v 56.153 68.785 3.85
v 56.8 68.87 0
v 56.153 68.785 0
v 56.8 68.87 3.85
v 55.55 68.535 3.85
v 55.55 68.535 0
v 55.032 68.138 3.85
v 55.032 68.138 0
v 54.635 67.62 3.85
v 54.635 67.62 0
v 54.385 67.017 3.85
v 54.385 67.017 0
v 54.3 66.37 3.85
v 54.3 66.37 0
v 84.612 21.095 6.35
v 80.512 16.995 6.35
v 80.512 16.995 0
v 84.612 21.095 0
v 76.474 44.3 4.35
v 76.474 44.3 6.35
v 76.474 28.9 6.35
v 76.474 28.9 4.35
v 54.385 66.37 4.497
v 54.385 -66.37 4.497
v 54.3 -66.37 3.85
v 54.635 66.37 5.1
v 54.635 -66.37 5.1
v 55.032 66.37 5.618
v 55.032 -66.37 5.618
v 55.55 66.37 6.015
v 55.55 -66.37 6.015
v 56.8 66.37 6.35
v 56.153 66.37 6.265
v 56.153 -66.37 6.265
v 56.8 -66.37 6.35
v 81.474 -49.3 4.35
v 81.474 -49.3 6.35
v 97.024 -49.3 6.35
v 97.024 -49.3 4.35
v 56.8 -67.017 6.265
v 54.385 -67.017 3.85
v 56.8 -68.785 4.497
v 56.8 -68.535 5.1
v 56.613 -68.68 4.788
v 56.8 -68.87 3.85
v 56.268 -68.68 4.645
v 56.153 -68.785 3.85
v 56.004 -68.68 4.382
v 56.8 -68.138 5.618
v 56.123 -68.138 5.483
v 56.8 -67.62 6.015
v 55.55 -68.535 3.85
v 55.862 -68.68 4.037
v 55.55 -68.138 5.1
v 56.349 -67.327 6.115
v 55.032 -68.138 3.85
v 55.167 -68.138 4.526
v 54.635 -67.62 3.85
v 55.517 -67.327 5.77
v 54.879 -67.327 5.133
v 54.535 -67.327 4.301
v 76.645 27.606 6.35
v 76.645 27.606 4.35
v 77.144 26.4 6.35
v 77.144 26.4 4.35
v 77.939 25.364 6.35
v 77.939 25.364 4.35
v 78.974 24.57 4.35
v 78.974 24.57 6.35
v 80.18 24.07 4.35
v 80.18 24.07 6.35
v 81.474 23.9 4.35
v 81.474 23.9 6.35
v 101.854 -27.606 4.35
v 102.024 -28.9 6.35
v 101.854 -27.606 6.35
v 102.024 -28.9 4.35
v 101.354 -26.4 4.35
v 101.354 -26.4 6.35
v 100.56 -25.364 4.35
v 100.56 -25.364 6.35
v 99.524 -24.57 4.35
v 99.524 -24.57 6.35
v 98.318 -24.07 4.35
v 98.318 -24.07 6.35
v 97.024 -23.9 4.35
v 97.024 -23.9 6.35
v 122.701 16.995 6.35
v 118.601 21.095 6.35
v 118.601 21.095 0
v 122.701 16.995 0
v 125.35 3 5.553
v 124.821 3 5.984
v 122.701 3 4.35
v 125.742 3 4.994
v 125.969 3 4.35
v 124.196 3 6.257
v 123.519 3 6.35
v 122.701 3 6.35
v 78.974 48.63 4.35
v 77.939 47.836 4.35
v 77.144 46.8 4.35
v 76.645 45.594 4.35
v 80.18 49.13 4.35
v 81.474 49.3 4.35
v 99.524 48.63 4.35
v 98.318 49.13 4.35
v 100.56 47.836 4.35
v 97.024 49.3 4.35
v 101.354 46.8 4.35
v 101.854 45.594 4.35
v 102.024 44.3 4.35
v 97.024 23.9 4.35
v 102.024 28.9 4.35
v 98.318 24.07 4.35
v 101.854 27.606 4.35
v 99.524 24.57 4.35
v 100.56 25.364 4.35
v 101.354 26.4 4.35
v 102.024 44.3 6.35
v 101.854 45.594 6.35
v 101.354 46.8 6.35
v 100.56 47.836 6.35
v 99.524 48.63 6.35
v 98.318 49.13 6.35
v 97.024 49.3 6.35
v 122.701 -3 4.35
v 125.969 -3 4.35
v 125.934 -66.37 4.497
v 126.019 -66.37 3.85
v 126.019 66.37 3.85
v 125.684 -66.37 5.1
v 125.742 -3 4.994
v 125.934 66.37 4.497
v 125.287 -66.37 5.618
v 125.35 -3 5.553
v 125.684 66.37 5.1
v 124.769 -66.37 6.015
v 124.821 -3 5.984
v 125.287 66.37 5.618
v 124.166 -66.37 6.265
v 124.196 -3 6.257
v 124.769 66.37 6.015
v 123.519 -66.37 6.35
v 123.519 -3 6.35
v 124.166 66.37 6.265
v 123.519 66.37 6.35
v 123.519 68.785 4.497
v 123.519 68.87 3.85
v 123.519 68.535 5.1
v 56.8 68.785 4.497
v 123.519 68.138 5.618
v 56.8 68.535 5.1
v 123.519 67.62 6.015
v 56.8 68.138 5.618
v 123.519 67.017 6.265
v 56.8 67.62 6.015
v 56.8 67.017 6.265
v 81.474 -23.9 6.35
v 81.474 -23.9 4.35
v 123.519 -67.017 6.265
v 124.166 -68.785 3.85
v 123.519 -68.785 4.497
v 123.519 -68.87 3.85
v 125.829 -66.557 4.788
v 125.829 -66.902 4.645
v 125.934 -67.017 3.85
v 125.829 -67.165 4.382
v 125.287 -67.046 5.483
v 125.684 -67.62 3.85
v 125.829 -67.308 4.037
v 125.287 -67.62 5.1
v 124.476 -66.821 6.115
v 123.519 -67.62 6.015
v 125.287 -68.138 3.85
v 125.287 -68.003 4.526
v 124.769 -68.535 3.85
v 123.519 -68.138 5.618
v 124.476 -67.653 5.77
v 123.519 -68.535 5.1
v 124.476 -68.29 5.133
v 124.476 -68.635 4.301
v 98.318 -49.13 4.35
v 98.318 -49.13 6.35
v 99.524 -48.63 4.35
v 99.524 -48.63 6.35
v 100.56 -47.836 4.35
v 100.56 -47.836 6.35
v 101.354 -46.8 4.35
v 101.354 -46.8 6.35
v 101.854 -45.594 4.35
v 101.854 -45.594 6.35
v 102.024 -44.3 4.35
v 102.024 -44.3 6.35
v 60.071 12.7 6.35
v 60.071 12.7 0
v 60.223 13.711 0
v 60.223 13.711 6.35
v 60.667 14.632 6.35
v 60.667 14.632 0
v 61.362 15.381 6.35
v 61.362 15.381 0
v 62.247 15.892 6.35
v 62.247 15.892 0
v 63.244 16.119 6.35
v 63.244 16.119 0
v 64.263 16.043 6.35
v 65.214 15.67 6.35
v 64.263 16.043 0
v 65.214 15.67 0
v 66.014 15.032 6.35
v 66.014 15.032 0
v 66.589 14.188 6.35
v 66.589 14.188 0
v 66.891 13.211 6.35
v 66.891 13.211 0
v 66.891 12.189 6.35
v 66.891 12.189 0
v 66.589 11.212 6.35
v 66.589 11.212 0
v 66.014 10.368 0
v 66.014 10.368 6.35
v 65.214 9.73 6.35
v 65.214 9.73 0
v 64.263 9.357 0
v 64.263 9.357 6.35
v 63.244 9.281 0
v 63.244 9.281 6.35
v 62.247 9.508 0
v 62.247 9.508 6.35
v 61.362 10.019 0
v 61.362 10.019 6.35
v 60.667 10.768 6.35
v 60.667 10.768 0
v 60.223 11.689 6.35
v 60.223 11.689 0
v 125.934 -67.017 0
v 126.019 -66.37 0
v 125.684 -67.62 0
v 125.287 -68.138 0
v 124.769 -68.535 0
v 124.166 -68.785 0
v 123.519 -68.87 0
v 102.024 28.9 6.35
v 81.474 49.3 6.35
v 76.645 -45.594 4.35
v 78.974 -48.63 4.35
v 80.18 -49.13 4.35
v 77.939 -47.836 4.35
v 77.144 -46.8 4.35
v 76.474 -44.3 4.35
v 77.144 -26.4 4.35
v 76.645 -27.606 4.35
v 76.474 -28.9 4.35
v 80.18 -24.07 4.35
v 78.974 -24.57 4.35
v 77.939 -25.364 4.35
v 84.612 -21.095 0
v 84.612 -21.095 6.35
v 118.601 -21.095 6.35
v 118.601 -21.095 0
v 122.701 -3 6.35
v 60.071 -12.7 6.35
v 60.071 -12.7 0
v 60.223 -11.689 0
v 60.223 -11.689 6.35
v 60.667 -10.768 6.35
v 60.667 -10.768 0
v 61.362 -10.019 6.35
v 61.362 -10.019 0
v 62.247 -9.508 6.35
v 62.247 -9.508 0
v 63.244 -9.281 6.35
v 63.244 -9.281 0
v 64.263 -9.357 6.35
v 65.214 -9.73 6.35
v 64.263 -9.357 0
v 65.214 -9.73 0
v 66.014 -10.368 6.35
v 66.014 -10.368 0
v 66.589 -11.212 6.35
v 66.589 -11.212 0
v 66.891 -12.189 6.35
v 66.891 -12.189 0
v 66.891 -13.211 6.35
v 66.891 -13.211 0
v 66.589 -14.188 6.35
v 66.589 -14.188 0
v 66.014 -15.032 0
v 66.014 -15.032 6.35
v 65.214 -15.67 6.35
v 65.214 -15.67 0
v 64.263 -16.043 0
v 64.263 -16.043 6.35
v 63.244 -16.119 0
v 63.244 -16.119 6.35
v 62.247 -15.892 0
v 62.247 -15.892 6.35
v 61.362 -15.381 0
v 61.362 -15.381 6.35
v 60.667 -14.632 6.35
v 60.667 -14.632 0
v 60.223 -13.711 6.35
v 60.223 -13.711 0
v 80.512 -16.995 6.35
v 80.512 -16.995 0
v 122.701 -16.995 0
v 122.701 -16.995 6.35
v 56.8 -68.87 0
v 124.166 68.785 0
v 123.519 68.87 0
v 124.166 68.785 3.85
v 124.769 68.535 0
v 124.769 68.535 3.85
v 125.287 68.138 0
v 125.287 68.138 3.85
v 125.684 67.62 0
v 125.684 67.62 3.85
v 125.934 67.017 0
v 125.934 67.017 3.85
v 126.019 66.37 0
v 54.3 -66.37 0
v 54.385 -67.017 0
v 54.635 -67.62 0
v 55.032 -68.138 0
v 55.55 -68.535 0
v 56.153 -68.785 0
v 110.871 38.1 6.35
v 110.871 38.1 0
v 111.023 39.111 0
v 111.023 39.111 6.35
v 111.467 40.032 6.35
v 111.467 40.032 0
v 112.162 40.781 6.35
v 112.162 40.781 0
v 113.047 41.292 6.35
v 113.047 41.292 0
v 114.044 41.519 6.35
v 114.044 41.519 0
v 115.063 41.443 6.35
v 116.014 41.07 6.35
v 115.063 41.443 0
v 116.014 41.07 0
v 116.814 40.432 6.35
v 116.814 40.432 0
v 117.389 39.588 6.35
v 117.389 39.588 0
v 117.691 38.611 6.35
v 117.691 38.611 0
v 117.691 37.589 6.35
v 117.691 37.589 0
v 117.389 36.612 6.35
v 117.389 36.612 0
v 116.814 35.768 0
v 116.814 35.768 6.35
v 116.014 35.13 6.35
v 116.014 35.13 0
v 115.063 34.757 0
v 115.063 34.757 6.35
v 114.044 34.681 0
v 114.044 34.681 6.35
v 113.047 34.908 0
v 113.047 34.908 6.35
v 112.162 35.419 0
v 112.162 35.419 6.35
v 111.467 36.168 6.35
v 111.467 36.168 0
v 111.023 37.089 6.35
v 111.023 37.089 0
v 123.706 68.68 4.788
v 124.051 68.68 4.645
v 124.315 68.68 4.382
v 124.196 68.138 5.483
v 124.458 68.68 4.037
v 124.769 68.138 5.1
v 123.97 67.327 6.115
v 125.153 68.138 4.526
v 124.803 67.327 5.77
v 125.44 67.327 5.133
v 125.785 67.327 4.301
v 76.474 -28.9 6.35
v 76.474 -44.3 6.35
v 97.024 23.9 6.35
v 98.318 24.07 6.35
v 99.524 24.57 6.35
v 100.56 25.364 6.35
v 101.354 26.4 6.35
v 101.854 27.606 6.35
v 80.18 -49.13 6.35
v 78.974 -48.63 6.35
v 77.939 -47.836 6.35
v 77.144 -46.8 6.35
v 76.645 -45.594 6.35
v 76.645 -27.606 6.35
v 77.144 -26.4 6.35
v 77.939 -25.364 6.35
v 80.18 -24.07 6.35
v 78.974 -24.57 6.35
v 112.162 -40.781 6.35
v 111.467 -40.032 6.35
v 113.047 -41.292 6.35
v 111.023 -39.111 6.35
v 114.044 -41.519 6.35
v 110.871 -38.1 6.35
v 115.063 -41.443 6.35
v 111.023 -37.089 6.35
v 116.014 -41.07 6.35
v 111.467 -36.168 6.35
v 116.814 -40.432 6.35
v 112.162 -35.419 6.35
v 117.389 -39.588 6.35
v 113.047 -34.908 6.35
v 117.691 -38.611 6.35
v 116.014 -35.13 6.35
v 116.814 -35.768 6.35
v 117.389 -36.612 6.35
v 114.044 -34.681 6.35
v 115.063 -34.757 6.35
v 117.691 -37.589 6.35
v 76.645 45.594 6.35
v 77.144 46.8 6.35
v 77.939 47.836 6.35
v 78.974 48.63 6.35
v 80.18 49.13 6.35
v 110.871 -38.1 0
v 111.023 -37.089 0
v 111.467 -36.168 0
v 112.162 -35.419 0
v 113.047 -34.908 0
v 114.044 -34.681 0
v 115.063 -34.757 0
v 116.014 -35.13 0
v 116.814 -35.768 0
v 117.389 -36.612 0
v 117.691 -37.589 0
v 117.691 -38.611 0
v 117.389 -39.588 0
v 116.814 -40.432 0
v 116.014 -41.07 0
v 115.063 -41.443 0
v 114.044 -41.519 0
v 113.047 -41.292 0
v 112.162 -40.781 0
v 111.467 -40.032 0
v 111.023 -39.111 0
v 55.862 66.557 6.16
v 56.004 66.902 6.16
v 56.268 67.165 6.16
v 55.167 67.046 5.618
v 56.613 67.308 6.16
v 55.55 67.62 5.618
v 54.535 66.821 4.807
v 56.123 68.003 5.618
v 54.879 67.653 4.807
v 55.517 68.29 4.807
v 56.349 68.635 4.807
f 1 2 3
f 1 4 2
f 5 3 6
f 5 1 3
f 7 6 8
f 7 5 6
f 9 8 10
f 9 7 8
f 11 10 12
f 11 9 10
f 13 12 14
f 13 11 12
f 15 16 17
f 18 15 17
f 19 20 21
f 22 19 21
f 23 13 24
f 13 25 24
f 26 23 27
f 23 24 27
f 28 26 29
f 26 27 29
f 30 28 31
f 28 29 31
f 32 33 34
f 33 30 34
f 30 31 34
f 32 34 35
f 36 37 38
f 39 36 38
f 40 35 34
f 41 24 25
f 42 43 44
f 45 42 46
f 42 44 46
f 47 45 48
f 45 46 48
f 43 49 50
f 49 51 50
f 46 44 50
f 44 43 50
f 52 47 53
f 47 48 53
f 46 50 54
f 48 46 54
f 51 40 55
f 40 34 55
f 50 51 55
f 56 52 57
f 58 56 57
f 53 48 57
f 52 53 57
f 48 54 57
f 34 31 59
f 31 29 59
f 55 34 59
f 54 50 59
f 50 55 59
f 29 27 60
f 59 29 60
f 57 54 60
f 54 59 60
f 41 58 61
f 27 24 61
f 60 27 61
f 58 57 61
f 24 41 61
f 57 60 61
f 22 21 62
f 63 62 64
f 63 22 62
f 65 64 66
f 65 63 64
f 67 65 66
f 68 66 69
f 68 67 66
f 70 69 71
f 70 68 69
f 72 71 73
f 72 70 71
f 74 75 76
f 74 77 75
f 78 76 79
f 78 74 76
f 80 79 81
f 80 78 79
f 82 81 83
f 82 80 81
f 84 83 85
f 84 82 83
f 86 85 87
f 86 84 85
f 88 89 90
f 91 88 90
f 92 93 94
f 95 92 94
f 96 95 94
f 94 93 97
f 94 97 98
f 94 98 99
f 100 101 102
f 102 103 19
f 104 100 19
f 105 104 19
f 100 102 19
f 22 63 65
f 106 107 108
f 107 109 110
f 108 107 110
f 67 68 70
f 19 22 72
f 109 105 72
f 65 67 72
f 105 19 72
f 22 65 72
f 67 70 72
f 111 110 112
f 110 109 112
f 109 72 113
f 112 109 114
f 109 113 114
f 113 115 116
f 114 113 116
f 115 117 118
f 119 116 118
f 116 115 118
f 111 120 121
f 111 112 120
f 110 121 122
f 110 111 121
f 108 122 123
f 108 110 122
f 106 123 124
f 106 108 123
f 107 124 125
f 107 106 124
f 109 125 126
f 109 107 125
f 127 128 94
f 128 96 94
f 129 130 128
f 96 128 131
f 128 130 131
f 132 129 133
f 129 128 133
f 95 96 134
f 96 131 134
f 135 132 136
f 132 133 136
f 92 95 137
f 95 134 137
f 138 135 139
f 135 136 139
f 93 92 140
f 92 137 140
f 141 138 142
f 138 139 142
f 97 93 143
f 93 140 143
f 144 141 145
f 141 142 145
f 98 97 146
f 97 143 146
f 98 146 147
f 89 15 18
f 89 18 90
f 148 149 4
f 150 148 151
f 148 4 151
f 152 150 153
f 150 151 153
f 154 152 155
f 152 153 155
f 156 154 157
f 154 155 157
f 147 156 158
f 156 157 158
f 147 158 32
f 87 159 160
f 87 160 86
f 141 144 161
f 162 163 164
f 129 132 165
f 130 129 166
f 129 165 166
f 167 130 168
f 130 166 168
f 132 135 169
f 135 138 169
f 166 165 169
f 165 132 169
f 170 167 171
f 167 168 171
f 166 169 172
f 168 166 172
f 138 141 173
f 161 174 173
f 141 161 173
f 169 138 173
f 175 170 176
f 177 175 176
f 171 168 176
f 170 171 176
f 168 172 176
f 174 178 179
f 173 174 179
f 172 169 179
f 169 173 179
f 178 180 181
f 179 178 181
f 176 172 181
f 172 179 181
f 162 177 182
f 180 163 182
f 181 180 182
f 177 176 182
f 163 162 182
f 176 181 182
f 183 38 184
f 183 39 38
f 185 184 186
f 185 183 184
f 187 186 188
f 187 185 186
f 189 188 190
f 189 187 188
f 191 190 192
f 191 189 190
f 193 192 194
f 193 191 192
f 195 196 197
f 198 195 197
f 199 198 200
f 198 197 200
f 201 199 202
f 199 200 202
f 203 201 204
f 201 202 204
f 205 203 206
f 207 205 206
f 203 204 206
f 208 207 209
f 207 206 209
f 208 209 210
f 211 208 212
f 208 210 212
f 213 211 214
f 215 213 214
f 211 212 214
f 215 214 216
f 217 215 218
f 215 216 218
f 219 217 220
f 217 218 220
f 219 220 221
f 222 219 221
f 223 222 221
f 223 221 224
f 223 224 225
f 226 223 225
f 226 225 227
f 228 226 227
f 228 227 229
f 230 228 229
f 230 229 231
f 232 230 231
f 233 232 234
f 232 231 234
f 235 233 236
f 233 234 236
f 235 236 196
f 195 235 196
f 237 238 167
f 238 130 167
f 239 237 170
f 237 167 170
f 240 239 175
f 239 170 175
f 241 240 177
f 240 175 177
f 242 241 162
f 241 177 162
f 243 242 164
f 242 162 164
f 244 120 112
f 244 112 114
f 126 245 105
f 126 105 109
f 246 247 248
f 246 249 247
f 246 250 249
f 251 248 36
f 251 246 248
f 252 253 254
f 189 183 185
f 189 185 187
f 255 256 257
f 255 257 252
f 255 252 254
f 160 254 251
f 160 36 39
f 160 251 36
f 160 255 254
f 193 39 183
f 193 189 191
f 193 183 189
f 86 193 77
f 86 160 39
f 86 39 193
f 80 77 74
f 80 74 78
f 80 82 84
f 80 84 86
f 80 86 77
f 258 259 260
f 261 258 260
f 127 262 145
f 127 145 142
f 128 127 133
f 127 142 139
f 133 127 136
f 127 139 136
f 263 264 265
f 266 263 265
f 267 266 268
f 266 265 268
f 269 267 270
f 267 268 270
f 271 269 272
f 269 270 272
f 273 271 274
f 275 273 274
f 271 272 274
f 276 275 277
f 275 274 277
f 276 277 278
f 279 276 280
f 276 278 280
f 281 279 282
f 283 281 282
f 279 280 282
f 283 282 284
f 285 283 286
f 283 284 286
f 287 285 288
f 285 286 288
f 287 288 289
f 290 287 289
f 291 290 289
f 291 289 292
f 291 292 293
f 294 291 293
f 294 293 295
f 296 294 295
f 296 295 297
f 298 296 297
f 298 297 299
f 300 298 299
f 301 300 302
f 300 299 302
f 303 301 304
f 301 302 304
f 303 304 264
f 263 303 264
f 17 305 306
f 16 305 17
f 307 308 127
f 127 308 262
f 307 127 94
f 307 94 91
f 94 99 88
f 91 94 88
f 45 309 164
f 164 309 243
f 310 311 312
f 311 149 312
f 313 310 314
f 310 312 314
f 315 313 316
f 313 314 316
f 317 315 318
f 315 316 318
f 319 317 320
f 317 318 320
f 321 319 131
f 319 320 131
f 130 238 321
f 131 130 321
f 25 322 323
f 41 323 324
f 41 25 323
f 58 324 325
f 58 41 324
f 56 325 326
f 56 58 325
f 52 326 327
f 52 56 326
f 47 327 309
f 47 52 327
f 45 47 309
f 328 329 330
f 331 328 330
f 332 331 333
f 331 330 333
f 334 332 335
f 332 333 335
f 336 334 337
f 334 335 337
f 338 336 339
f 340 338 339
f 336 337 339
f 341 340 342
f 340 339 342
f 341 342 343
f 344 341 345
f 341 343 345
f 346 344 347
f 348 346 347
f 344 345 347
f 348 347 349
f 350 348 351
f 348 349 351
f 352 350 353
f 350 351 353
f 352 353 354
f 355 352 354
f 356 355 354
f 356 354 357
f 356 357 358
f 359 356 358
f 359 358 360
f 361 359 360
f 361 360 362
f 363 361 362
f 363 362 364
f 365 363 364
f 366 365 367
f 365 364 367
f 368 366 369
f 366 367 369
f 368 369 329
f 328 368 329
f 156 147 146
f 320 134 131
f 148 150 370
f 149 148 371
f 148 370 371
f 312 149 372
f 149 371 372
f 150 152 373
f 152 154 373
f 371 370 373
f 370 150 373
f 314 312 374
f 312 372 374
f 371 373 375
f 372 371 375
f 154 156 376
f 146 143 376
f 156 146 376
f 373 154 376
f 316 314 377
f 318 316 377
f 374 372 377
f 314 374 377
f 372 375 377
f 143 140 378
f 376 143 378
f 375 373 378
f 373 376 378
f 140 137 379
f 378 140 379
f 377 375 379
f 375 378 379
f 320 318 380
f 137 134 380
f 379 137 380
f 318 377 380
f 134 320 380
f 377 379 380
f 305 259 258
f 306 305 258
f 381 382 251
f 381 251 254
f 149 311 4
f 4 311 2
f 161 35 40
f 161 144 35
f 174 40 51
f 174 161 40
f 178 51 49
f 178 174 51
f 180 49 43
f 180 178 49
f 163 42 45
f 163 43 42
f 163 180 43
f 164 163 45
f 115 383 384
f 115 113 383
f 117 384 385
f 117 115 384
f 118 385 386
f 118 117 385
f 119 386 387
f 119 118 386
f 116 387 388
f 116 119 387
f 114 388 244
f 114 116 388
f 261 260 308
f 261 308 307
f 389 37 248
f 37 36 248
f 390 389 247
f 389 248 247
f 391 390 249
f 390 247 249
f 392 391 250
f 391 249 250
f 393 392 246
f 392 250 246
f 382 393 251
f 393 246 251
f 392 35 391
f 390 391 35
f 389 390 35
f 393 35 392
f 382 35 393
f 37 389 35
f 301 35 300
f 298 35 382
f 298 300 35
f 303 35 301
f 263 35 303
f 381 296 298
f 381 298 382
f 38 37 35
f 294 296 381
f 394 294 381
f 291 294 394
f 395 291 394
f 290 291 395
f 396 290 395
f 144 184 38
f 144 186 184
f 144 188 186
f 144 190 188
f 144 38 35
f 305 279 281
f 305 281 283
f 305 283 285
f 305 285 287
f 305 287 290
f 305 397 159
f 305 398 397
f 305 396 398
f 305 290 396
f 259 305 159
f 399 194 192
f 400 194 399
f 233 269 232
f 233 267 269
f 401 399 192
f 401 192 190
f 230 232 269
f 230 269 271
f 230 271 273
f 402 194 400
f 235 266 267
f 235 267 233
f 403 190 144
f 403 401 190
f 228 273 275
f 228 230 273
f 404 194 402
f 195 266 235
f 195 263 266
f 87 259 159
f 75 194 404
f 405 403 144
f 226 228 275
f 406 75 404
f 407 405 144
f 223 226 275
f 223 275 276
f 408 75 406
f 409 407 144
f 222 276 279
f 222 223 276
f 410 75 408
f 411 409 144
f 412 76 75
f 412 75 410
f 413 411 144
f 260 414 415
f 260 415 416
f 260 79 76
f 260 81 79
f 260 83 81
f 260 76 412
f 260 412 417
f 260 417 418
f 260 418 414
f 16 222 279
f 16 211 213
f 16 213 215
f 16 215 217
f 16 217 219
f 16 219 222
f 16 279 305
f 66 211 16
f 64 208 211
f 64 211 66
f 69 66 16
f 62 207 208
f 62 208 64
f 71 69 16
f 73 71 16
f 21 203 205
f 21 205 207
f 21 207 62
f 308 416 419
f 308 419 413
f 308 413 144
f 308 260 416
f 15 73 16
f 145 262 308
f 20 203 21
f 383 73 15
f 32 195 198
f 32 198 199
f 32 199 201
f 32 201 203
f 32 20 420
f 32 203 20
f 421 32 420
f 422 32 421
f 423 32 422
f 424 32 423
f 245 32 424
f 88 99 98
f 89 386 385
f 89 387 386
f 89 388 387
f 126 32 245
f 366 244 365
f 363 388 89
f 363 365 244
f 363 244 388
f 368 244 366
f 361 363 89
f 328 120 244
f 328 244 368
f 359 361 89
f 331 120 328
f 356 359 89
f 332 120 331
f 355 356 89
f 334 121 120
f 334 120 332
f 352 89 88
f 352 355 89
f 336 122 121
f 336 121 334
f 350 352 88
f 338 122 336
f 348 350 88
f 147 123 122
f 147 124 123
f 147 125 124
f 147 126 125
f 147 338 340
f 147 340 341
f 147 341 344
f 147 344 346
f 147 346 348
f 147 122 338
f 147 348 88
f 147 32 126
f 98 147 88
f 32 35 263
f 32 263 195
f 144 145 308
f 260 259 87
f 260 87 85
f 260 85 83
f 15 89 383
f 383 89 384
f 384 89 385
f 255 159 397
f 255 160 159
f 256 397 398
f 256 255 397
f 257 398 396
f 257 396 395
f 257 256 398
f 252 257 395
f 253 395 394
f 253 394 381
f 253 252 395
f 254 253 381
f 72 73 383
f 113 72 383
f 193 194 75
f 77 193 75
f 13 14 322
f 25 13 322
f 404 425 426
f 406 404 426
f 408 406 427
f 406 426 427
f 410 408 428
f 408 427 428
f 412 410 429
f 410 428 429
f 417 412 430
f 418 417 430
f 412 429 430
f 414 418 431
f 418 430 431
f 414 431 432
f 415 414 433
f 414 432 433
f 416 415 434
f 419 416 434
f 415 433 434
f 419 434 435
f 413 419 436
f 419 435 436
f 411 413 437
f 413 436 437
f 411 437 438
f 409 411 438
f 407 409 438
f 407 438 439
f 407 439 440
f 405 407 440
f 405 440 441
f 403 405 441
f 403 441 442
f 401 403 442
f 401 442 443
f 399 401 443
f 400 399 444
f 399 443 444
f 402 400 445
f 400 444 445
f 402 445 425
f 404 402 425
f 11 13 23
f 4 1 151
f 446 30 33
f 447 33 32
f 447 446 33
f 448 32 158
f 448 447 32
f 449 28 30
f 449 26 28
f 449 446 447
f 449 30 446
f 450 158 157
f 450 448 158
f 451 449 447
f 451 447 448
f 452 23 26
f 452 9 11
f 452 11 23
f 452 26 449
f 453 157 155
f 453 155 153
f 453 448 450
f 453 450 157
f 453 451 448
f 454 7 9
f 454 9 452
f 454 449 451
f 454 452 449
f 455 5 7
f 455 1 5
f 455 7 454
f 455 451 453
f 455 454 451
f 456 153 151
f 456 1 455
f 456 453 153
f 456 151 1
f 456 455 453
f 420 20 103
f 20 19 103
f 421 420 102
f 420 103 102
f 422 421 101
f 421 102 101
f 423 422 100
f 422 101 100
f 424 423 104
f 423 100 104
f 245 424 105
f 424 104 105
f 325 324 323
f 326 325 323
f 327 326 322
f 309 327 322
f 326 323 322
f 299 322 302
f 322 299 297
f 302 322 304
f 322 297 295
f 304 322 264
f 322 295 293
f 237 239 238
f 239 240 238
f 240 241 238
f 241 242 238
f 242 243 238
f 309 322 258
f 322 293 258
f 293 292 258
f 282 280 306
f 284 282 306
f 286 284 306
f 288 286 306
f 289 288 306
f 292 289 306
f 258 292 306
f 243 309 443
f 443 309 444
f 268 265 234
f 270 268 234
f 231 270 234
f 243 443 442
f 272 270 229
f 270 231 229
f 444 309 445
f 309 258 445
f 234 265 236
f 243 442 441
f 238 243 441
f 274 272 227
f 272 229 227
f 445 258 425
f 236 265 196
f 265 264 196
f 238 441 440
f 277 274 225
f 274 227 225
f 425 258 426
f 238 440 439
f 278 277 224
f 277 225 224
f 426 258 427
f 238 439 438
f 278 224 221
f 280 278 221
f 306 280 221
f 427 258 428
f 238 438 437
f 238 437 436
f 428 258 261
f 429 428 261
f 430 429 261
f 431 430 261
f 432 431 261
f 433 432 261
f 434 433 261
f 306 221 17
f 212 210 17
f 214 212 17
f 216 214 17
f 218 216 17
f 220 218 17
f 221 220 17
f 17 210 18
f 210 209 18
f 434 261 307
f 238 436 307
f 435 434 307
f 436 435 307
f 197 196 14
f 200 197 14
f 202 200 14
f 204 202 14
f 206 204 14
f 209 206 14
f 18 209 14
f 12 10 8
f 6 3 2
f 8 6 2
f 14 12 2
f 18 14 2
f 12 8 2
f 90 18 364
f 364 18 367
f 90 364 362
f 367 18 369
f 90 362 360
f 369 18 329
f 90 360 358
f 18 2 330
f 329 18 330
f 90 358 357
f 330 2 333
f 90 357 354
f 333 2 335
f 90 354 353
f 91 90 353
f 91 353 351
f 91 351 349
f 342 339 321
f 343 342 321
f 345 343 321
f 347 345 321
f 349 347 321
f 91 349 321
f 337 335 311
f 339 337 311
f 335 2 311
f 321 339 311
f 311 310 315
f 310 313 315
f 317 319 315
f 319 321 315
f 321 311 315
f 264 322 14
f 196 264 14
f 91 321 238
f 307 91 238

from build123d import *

# Parameters (mm, degrees)
BOSS_EXTRUDE3_DEPTH  = 6.35
SKETCH6_R            = 3.429
CUT_EXTRUDE5_DEPTH   = 6.35
FILLET2_R            = 2.5
SKETCH7_R            = 3.43
CUT_EXTRUDE6_DEPTH   = 144.750797039
SKETCH10_W           = 42.1894
SKETCH10_H           = 42.1894
CUT_EXTRUDE8_DEPTH   = 144.750797039
CUT_EXTRUDE9_DEPTH   = 2
SKETCH12_W           = 25.550132031
SKETCH12_H           = 25.4
CUT_EXTRUDE10_DEPTH  = 2
FILLET3_R            = 5
FILLET3_OF_MIRROR1_R = 5
CHAMFER1_SIZE        = 4.1


with BuildPart() as part:
    # Sketch1 → Boss-Extrude3 (new body)
    with BuildSketch(Plane.XY):
        Polygon((126.019412193, 68.87), (68.0566, 68.87), (62.2146, 68.87), (54.299929099, 68.87), (54.299929099, -68.87), (62.2146, -68.87), (126.019412193, -68.87), align=None)
    extrude(amount=BOSS_EXTRUDE3_DEPTH)

    # Sketch6 → Cut-Extrude5 (cut)
    with BuildSketch(Plane(origin=(0, 0, 0), x_dir=(-1, 0, 0), z_dir=(0, 0, -1))):
        with Locations((-63.5, 12.7)):
            Circle(SKETCH6_R)
        with Locations((-114.3, 38.1)):
            Circle(SKETCH6_R)
        with Locations((-114.3, -38.1)):
            Circle(SKETCH6_R)
        with Locations((-63.5, -12.7)):
            Circle(SKETCH6_R)
    extrude(amount=-CUT_EXTRUDE5_DEPTH, mode=Mode.SUBTRACT)

    # Fillet2
    fillet2_edges = [part.edges().sort_by_distance(p)[0] for p in [
        (54.299929099, 68.87, 3.175),
        (54.299929099, 0, 6.35),
        (90.159670646, -68.87, 6.35),
        (126.019412193, 0, 6.35),
        (90.159670646, 68.87, 6.35),
        (126.019412193, 68.87, 3.175),
        (126.019412193, -68.87, 3.175),
        (54.299929099, -68.87, 3.175),
    ]]
    fillet(fillet2_edges, radius=FILLET2_R)

    # Sketch7 → Cut-Extrude6 (cut, through all)
    with BuildSketch(Plane.XY.offset(6.35)):
        with Locations((90.159670646, 0)):
            Circle(SKETCH7_R)
    extrude(amount=-CUT_EXTRUDE6_DEPTH, mode=Mode.SUBTRACT)

    # Sketch10 → Cut-Extrude8 (cut, through all)
    with BuildSketch(Plane.XY.offset(6.35)):
        with Locations((101.606785129, 0)):
            Rectangle(SKETCH10_W, SKETCH10_H)
    extrude(amount=-CUT_EXTRUDE8_DEPTH, mode=Mode.SUBTRACT)

    # Sketch11 → Cut-Extrude9 (cut)
    with BuildSketch(Plane.XY.offset(6.35)):
        Polygon((123.519412193, -3), (122.701485129, -3), (122.701485129, 3), (123.519412193, 3), (127.39852583, 3), (127.39852583, -3), align=None)
    extrude(amount=-CUT_EXTRUDE9_DEPTH, mode=Mode.SUBTRACT)

    # Sketch12 → Cut-Extrude10 (cut)
    with BuildSketch(Plane.XY.offset(6.35)):
        with Locations((89.249266016, -36.599999996)):
            Rectangle(SKETCH12_W, SKETCH12_H)
    cut_extrude10 = extrude(amount=-CUT_EXTRUDE10_DEPTH, mode=Mode.SUBTRACT)

    # Fillet3
    fillet3_edges = [part.edges().sort_by_distance(p)[0] for p in [
        (76.4742, -49.299999996, 5.35),
        (76.4742, -23.899999996, 5.35),
        (102.024332031, -23.899999996, 5.35),
        (102.024332031, -49.299999996, 5.35),
    ]]
    fillet(fillet3_edges, radius=FILLET3_R)

    # Mirror1: Cut-Extrude10 across plane
    add(cut_extrude10.mirror(Plane(origin=(0, 0, 0), x_dir=(0, 0, 1), z_dir=(0, -1, 0))), mode=Mode.SUBTRACT)

    # Fillet3 of Mirror1
    fillet3_of_mirror1_edges = [part.edges().sort_by_distance(p)[0] for p in [
        (76.4742, 49.299999996, 5.35),
        (76.4742, 23.899999996, 5.35),
        (102.024332031, 23.899999996, 5.35),
        (102.024332031, 49.299999996, 5.35),
    ]]
    fillet(fillet3_of_mirror1_edges, radius=FILLET3_OF_MIRROR1_R)

    # Chamfer1
    chamfer1_edges = [part.edges().sort_by_distance(p)[0] for p in [
        (122.701485129, 21.0947, 3.175),
        (122.701485129, -21.0947, 3.175),
        (80.512085129, -21.0947, 3.175),
        (80.512085129, 21.0947, 3.175),
    ]]
    chamfer(chamfer1_edges, length=CHAMFER1_SIZE)


solid = part.part
